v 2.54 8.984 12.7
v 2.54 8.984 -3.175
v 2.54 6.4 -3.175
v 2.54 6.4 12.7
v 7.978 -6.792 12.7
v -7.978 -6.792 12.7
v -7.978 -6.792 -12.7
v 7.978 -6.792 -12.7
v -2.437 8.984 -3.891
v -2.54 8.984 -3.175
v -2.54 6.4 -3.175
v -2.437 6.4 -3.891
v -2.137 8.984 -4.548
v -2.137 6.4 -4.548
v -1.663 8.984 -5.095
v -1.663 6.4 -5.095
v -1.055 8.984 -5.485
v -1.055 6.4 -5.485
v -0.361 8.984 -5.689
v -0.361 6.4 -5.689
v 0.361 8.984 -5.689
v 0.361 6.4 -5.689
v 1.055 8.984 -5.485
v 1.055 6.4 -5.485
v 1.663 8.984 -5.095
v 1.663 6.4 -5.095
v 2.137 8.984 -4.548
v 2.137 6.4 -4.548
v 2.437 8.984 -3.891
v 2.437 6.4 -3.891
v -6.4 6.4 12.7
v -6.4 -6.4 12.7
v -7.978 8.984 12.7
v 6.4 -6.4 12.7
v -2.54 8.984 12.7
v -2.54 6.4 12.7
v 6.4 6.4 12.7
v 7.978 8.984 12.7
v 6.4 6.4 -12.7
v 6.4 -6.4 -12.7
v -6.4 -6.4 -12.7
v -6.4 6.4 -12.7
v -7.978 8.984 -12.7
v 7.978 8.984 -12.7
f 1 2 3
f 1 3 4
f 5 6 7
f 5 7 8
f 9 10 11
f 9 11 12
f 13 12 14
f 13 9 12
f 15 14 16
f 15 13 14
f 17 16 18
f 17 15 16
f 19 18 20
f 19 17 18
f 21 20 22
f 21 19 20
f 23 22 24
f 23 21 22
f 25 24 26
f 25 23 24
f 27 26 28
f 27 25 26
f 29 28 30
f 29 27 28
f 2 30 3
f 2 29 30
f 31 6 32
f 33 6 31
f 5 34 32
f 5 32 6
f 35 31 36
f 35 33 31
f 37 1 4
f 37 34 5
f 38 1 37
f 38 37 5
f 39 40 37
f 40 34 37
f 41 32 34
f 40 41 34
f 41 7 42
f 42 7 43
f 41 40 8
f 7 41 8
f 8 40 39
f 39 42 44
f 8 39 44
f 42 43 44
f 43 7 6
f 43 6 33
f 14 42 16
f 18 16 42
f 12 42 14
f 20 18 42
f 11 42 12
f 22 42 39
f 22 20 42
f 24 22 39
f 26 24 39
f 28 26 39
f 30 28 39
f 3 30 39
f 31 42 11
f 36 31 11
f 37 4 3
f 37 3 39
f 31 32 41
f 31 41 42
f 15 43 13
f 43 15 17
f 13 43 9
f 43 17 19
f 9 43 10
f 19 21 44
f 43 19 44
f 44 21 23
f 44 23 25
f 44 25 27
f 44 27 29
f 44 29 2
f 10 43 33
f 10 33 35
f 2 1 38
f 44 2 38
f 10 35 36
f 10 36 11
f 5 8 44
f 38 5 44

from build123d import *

# Parameters (mm, degrees)
SKETCH1_W           = 15.95500004
SKETCH1_H           = 15.775635
SKETCH1_W_2         = 12.8
SKETCH1_H_2         = 12.8
BOSS_EXTRUDE1_DEPTH = 12.7
CUT_EXTRUDE1_DEPTH  = 12.7


with BuildPart() as part:
    # Sketch1 → Boss-Extrude1 (new body, symmetric)
    with BuildSketch(Plane.XY):
        with Locations((0, 1.0956925)):
            Rectangle(SKETCH1_W, SKETCH1_H)
        Rectangle(SKETCH1_W_2, SKETCH1_H_2, mode=Mode.SUBTRACT)
    extrude(amount=BOSS_EXTRUDE1_DEPTH, both=True)

    # Sketch2 → Cut-Extrude1 (cut)
    with BuildSketch(Plane(origin=(0, 8.98351, 0), x_dir=(1, 0, 0), z_dir=(0, 1, 0))):
        with BuildLine():
            Line((2.54, 3.175), (2.54, -12.7))
            Line((2.54, -12.7), (-2.54, -12.7))
            Line((-2.54, -12.7), (-2.54, 3.175))
            ThreePointArc((-2.54, 3.175), (0, 5.715), (2.54, 3.175))
        make_face()
    extrude(amount=-CUT_EXTRUDE1_DEPTH, mode=Mode.SUBTRACT)


solid = part.part
